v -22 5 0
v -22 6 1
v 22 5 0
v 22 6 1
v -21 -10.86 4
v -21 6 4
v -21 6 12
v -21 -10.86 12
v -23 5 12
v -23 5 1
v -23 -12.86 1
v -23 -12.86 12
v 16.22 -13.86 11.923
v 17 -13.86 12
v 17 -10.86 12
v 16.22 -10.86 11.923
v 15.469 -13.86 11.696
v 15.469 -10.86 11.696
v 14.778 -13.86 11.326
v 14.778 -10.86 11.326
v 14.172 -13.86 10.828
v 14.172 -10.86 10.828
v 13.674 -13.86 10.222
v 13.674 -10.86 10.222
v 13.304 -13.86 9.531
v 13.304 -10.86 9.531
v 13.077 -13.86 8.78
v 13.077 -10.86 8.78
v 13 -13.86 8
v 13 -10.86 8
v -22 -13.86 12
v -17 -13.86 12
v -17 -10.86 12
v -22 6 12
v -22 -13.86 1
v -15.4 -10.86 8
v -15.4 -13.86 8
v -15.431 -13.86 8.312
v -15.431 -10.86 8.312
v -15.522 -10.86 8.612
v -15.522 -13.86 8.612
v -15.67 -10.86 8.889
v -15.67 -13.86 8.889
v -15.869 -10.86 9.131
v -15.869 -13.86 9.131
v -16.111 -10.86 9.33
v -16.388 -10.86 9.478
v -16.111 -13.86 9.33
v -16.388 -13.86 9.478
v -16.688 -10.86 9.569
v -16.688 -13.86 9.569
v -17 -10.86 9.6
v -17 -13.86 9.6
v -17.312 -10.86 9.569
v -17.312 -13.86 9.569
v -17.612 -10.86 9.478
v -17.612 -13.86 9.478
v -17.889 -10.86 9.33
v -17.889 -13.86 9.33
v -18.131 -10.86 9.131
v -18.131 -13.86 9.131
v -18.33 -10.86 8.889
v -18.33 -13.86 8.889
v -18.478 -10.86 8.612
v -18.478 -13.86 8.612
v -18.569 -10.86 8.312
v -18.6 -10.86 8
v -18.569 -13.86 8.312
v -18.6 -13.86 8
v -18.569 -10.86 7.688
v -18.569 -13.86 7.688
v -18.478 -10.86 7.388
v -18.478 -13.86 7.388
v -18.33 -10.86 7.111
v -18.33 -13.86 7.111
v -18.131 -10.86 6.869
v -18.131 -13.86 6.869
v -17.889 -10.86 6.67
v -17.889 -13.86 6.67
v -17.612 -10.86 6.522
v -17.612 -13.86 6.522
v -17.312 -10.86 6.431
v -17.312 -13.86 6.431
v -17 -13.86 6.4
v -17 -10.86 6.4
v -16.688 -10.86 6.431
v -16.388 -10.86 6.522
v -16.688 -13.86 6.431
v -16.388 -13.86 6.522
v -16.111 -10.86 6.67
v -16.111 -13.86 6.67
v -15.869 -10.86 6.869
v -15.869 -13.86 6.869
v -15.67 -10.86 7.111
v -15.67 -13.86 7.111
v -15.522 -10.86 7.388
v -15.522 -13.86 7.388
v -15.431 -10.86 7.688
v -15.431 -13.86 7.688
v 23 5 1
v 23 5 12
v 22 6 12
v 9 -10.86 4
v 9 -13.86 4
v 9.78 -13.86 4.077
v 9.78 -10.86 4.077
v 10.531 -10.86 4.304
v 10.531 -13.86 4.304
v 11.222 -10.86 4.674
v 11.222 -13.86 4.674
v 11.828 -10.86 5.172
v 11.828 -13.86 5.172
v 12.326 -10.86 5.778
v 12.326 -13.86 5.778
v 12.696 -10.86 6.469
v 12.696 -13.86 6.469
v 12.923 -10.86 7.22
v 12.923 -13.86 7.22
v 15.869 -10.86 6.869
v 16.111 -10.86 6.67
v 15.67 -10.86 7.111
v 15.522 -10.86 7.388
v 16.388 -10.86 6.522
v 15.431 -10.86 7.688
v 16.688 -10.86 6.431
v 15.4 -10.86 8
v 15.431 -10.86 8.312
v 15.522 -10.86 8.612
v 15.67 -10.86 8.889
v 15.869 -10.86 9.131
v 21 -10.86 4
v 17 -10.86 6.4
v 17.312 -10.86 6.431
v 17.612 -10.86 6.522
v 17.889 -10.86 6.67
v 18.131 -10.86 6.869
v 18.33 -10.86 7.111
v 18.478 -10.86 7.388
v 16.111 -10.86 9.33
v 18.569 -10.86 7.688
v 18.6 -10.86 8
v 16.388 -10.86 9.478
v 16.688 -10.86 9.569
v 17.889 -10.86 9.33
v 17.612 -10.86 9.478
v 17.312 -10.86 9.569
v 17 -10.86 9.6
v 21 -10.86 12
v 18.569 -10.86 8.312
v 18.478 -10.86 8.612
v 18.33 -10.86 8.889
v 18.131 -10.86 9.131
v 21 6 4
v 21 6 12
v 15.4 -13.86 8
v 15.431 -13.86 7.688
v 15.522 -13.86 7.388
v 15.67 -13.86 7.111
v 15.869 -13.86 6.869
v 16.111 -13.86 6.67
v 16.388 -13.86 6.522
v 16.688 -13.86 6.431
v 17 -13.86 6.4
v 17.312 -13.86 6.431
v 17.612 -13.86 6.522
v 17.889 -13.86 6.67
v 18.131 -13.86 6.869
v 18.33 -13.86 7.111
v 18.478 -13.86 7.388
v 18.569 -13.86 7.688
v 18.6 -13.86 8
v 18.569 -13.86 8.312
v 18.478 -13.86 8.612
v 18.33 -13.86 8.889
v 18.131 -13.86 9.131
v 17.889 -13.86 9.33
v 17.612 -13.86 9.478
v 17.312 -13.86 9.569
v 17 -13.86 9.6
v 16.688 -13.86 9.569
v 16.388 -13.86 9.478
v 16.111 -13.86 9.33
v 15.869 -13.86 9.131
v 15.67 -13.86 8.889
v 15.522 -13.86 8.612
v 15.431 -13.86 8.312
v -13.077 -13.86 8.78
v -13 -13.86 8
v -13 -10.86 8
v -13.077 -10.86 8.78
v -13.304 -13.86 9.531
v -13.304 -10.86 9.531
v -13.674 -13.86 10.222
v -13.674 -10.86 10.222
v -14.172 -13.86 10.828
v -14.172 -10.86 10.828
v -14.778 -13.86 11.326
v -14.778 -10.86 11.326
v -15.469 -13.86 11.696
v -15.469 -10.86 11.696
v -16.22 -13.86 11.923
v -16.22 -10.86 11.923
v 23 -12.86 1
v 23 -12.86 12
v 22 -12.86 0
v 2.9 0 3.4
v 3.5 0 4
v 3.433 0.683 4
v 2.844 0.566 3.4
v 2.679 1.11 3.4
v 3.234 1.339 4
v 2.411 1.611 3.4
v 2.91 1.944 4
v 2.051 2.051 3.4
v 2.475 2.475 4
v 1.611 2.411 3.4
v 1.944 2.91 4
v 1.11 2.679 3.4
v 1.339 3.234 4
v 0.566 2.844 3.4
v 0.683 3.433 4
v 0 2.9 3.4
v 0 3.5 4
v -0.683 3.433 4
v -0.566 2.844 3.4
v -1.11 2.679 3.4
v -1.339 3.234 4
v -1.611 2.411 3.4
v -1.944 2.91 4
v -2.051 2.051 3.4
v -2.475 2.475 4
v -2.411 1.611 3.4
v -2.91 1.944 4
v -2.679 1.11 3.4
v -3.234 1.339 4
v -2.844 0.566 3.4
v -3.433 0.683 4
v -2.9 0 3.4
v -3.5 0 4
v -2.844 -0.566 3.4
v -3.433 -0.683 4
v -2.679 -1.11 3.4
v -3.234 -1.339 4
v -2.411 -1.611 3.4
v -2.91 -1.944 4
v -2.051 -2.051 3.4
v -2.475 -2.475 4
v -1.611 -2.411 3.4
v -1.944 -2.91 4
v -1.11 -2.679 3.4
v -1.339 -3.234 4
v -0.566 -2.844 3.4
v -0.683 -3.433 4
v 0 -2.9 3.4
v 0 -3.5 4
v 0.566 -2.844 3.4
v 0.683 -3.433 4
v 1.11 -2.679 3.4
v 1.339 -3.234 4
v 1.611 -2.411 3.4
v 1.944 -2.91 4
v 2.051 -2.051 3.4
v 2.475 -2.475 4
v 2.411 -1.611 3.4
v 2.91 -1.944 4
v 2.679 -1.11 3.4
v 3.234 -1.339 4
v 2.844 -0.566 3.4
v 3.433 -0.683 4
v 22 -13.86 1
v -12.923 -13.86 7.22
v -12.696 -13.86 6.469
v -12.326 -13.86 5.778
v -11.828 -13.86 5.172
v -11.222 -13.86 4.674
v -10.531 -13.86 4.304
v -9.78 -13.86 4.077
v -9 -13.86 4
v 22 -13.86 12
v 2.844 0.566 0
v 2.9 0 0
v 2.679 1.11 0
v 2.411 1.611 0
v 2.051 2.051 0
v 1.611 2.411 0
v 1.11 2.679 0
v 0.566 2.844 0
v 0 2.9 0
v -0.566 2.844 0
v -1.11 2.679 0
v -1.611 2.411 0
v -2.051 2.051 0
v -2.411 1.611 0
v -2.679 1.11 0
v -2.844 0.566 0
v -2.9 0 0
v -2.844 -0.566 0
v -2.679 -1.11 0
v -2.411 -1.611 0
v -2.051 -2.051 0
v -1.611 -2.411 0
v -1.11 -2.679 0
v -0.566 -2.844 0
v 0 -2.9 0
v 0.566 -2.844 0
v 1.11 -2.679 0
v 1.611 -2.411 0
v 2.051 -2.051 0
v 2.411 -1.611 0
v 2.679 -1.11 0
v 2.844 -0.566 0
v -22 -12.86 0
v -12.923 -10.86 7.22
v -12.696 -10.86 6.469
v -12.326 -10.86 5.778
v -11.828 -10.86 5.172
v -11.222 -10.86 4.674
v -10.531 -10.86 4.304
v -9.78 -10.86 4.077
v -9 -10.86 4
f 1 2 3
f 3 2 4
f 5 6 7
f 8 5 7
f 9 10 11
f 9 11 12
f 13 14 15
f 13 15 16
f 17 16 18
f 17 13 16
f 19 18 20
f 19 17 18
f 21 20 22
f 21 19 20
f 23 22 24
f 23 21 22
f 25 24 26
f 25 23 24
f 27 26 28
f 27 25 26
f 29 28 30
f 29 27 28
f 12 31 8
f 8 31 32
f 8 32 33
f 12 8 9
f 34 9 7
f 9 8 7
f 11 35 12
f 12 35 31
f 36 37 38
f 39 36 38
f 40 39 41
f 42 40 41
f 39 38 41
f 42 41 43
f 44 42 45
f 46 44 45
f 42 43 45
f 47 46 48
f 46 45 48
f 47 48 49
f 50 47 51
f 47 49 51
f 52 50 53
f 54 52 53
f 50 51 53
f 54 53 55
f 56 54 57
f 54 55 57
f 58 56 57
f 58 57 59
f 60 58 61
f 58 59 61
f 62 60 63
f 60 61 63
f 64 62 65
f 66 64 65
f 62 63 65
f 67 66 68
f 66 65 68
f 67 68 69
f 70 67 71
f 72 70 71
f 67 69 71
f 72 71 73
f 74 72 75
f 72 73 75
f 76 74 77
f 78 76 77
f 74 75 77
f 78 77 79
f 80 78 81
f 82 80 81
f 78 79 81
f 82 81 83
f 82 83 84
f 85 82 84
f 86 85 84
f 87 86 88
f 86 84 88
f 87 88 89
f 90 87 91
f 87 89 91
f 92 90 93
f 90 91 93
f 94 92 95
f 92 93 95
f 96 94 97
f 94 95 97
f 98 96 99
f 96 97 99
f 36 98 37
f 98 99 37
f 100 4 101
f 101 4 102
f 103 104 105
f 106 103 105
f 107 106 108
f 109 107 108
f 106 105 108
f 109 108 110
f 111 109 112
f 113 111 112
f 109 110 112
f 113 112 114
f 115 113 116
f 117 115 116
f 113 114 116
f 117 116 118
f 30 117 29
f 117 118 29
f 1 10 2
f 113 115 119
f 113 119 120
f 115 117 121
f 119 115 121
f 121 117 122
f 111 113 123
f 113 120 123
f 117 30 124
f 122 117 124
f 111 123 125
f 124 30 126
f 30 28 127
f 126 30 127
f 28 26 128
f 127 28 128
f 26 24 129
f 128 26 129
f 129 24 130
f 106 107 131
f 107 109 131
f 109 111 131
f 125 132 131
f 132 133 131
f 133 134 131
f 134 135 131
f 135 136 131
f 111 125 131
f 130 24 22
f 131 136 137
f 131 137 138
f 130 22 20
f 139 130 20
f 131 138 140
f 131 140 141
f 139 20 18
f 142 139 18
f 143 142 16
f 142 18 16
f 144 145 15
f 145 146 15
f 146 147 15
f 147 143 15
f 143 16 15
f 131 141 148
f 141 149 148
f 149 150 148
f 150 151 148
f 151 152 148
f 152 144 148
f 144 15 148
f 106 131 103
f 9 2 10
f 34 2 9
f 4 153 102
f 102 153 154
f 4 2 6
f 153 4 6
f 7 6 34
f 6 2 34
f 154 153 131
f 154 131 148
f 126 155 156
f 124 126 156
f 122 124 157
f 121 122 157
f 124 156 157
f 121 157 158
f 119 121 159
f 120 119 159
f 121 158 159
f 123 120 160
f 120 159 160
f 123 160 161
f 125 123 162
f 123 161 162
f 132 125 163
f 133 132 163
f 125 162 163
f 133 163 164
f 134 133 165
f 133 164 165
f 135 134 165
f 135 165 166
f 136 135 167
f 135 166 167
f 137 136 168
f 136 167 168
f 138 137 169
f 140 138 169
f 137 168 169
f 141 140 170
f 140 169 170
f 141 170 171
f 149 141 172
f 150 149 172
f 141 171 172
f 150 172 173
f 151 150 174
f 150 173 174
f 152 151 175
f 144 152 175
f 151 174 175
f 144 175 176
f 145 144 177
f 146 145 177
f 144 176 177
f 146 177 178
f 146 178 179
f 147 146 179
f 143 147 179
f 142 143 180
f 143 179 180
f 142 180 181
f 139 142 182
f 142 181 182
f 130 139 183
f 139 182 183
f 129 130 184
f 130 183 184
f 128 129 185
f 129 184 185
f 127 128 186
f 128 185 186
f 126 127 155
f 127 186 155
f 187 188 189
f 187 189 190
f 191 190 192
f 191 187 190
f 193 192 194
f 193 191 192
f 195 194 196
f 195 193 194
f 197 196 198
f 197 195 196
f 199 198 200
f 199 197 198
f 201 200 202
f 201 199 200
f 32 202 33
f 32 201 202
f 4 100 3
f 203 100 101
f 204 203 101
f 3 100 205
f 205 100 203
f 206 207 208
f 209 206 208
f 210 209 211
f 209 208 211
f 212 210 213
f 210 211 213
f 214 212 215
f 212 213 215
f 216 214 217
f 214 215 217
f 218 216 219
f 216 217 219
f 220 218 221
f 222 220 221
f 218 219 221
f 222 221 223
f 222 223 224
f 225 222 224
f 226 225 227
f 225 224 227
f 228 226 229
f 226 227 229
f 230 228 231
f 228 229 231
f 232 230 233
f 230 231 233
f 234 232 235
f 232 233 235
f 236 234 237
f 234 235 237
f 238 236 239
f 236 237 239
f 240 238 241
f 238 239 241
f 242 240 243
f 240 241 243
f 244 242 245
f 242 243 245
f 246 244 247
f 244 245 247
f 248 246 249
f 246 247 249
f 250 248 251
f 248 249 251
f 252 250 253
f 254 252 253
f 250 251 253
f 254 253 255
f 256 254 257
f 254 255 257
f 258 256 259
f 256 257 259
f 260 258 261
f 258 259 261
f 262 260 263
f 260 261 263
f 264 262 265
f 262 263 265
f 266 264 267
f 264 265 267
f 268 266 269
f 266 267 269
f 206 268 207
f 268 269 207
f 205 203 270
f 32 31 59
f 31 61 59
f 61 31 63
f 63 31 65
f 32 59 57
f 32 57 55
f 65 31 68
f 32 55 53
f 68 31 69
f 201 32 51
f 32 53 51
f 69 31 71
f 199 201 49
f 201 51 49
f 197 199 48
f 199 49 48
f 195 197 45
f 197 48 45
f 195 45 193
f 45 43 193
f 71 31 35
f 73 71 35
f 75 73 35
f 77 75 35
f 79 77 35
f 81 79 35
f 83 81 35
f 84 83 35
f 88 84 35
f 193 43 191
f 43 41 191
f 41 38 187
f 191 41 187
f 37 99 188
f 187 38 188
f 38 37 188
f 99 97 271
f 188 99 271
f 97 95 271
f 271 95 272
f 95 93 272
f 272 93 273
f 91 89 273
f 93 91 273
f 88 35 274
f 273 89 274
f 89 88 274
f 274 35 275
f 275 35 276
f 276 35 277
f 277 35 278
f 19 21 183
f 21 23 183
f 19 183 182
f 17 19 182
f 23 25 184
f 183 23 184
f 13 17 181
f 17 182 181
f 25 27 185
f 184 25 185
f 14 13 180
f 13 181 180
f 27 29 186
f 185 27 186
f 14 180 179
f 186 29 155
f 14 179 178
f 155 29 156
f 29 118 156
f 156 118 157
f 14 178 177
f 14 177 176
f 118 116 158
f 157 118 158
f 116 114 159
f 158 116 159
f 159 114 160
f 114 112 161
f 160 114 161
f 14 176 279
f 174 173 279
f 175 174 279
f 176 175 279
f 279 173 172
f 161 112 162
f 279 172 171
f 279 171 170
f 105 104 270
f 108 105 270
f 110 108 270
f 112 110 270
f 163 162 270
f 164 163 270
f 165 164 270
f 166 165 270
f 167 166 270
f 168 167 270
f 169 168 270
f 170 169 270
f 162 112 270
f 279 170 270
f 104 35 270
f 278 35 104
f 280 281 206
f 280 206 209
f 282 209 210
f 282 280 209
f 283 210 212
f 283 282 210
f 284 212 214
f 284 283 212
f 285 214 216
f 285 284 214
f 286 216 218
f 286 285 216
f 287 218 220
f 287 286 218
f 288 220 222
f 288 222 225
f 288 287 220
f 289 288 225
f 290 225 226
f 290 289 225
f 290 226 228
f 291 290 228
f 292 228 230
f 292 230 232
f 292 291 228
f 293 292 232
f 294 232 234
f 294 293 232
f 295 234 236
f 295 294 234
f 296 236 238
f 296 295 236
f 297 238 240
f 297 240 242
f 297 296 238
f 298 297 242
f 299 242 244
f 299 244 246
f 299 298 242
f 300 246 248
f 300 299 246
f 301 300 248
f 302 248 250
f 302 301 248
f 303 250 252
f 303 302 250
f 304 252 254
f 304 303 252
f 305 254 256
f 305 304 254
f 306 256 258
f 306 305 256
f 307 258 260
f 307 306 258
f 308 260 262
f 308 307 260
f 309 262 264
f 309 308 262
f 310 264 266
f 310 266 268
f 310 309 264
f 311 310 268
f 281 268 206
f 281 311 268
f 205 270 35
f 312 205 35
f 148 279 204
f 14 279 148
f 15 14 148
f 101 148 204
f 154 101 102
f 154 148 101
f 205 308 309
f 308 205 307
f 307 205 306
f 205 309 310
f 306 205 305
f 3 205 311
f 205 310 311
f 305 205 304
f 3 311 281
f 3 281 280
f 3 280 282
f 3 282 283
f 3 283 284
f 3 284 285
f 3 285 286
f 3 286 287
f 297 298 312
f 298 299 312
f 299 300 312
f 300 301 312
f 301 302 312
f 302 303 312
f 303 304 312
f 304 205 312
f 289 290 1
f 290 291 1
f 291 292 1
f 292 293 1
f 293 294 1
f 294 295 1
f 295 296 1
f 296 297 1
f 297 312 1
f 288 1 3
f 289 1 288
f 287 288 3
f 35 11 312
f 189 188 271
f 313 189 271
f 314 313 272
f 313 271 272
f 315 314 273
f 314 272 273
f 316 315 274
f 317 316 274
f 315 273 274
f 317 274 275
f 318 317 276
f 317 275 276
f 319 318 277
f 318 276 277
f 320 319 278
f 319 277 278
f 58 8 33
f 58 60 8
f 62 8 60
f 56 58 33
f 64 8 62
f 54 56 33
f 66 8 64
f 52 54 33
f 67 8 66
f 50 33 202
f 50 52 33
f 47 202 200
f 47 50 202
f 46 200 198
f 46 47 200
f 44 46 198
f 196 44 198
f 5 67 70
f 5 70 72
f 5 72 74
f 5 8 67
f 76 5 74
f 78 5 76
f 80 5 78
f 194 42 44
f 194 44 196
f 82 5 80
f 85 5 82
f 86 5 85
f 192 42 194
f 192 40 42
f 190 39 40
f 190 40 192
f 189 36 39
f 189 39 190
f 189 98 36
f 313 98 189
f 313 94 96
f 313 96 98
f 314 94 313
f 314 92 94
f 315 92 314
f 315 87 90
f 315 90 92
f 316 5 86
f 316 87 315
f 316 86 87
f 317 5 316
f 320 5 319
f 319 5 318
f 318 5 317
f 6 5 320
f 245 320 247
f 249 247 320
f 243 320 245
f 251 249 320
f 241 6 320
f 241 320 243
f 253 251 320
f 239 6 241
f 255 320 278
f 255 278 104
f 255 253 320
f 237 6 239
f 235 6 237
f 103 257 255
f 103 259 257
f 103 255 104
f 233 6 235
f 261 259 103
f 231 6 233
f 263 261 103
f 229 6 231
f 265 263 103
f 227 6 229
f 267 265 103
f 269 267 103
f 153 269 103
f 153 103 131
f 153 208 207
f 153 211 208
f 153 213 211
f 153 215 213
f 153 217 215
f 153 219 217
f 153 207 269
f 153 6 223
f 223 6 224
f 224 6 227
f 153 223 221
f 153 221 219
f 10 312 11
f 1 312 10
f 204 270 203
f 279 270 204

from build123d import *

# Parameters (mm, degrees)
SKETCH_1_R       = 2.9
EXTRUDE_1_DEPTH  = 4
CHAMFER_1_SIZE   = 0.6
SKETCH_3_W       = 12
SKETCH_3_H       = 19.86
EXTRUDE_2_DEPTH  = 2
SKETCH_4_W       = 10
SKETCH_4_H       = 12
SKETCH_4_R       = 1.6
EXTRUDE_3_DEPTH  = 3
FILLET_START     = -15
FILLET_2_DEPTH   = 4.14
FILLET_START_2   = -13.86
FILLET_2_2_DEPTH = 3
CHAMFER_4_SIZE   = 1


with BuildPart() as part:
    # 草图1 → 凸台-拉伸1 (new body)
    with BuildSketch(Plane.XY):
        Polygon((7.937253933, 6), (-21, 6), (-21, -13.86), (7.937253933, -13.86), (21, -13.86), (21, 6), align=None)
        Circle(SKETCH_1_R, mode=Mode.SUBTRACT)
    extrude(amount=EXTRUDE_1_DEPTH)

    # 倒角1
    chamfer_1_edges = [part.edges().sort_by_distance(p)[0] for p in [
        (-2.9, 0, 4),
    ]]
    chamfer(chamfer_1_edges, length=CHAMFER_1_SIZE)

    # 草图3 → 凸台-拉伸2 (add)
    with BuildSketch(Plane.ZY.offset(21)):
        with Locations((6, -3.93)):
            Rectangle(SKETCH_3_W, SKETCH_3_H)
    extrude_2 = extrude(amount=EXTRUDE_2_DEPTH)

    # 镜向1: 凸台-拉伸2 across plane
    add(extrude_2.mirror(Plane(origin=(0, 0, 0), x_dir=(0, 0, 1), z_dir=(1, 0, 0))))

    # 草图4 → 凸台-拉伸3 (add)
    # profile 1 of 2: a face of its own
    with BuildSketch(Plane.XZ.offset(13.86)):
        with Locations((-18, 6)):
            Rectangle(SKETCH_4_W, SKETCH_4_H)
        with Locations((-17, 8)):
            Circle(SKETCH_4_R, mode=Mode.SUBTRACT)
    # profile 2 of 2: a face of its own
    with BuildSketch(Plane.XZ.offset(13.86)):
        with Locations((18, 6)):
            Rectangle(SKETCH_4_W, SKETCH_4_H)
        with Locations(Location((17, 8, 0), (0, 0, 180))):
            Circle(SKETCH_4_R, mode=Mode.SUBTRACT)
    extrude(amount=-EXTRUDE_3_DEPTH)

    # 圆角2: read off the stored shape, not the designer's step
    # 圆角2 outline → 圆角2 (cut)
    with BuildSketch(Plane(origin=(0, 0, 0), x_dir=(1, 0, 0), z_dir=(0, 1, 0)).offset(FILLET_START)):
        with BuildLine():
            Line((13, -12), (17, -12))
            ThreePointArc((17, -12), (14.171572875, -10.828427125), (13, -8))
            Line((13, -8), (13, -12))
        make_face()
        with BuildLine():
            Line((-13, -12), (-13, -8))
            ThreePointArc((-13, -8), (-14.171572875, -10.828427125), (-17, -12))
            Line((-17, -12), (-13, -12))
        make_face()
    extrude(amount=FILLET_2_DEPTH, mode=Mode.SUBTRACT)

    # Fillet 2 2 outline → Fillet 2 2 (add)
    with BuildSketch(Plane(origin=(0, 0, 0), x_dir=(1, 0, 0), z_dir=(0, 1, 0)).offset(FILLET_START_2)):
        with BuildLine():
            ThreePointArc((-13, -8), (-11.828427125, -5.171572875), (-9, -4))
            Line((-9, -4), (-13, -4))
            Line((-13, -4), (-13, -8))
        make_face()
        with BuildLine():
            ThreePointArc((9, -4), (11.828427125, -5.171572875), (13, -8))
            Line((13, -8), (13, -4))
            Line((13, -4), (9, -4))
        make_face()
    extrude(amount=FILLET_2_2_DEPTH)

    # 倒角4
    chamfer_4_edges = [part.edges().sort_by_distance(p)[0] for p in [
        (-23, 6, 6),
        (-23, -3.93, 0),
        (-23, -13.86, 6),
        (23, -13.86, 6),
        (23, -3.93, 0),
        (23, 6, 6),
        (0, 6, 0),
        (0, -13.86, 0),
    ]]
    chamfer(chamfer_4_edges, length=CHAMFER_4_SIZE)


solid = part.part
